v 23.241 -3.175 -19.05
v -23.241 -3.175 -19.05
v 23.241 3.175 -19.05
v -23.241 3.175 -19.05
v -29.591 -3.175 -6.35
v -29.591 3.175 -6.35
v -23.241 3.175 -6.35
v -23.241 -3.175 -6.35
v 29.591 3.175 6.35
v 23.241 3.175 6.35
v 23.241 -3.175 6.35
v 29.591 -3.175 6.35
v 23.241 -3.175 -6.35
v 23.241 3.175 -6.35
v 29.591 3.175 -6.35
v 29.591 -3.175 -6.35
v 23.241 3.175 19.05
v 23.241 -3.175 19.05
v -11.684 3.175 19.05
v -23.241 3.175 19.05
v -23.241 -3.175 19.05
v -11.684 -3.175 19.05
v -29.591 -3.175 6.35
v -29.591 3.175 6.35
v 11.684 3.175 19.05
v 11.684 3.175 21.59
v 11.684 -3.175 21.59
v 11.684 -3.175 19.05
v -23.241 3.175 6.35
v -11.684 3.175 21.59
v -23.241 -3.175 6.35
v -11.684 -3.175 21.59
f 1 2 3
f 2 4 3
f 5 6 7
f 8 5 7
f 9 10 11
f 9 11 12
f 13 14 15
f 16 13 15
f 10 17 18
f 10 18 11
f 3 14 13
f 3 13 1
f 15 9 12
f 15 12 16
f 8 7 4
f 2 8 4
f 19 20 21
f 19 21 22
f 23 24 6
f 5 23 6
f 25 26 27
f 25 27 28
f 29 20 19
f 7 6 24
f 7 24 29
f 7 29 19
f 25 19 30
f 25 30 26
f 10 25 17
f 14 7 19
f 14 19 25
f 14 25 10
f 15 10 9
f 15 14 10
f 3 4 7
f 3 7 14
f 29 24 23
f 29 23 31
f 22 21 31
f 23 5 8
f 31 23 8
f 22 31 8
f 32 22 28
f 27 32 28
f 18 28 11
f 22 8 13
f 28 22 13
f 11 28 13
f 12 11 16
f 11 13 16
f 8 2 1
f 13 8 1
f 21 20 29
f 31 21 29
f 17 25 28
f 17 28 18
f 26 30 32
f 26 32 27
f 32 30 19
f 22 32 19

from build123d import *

# Parameters (mm, degrees)
SKETCH1_W           = 46.482
SKETCH1_H           = 38.1
BOSS_EXTRUDE1_DEPTH = 3.175
SKETCH2_W           = 23.368
SKETCH2_H           = 2.54
SKETCH2_W_2         = 6.35
SKETCH2_H_2         = 12.7
BOSS_EXTRUDE2_DEPTH = 6.35


with BuildPart() as part:
    # Sketch1 → Boss-Extrude1 (new body, symmetric)
    with BuildSketch(Plane(origin=(0, 0, 0), x_dir=(1, 0, 0), z_dir=(0, 1, 0))):
        Rectangle(SKETCH1_W, SKETCH1_H)
    extrude(amount=BOSS_EXTRUDE1_DEPTH, both=True)

    # Sketch2 → Boss-Extrude2 (add)
    with BuildSketch(Plane(origin=(0, 3.175, 0), x_dir=(1, 0, 0), z_dir=(0, 1, 0))):
        with Locations((0, -20.32)):
            Rectangle(SKETCH2_W, SKETCH2_H)
        with Locations((-26.416, 0)):
            Rectangle(SKETCH2_W_2, SKETCH2_H_2)
        with Locations((26.416, 0)):
            Rectangle(SKETCH2_W_2, SKETCH2_H_2)
    extrude(amount=-BOSS_EXTRUDE2_DEPTH)


solid = part.part
